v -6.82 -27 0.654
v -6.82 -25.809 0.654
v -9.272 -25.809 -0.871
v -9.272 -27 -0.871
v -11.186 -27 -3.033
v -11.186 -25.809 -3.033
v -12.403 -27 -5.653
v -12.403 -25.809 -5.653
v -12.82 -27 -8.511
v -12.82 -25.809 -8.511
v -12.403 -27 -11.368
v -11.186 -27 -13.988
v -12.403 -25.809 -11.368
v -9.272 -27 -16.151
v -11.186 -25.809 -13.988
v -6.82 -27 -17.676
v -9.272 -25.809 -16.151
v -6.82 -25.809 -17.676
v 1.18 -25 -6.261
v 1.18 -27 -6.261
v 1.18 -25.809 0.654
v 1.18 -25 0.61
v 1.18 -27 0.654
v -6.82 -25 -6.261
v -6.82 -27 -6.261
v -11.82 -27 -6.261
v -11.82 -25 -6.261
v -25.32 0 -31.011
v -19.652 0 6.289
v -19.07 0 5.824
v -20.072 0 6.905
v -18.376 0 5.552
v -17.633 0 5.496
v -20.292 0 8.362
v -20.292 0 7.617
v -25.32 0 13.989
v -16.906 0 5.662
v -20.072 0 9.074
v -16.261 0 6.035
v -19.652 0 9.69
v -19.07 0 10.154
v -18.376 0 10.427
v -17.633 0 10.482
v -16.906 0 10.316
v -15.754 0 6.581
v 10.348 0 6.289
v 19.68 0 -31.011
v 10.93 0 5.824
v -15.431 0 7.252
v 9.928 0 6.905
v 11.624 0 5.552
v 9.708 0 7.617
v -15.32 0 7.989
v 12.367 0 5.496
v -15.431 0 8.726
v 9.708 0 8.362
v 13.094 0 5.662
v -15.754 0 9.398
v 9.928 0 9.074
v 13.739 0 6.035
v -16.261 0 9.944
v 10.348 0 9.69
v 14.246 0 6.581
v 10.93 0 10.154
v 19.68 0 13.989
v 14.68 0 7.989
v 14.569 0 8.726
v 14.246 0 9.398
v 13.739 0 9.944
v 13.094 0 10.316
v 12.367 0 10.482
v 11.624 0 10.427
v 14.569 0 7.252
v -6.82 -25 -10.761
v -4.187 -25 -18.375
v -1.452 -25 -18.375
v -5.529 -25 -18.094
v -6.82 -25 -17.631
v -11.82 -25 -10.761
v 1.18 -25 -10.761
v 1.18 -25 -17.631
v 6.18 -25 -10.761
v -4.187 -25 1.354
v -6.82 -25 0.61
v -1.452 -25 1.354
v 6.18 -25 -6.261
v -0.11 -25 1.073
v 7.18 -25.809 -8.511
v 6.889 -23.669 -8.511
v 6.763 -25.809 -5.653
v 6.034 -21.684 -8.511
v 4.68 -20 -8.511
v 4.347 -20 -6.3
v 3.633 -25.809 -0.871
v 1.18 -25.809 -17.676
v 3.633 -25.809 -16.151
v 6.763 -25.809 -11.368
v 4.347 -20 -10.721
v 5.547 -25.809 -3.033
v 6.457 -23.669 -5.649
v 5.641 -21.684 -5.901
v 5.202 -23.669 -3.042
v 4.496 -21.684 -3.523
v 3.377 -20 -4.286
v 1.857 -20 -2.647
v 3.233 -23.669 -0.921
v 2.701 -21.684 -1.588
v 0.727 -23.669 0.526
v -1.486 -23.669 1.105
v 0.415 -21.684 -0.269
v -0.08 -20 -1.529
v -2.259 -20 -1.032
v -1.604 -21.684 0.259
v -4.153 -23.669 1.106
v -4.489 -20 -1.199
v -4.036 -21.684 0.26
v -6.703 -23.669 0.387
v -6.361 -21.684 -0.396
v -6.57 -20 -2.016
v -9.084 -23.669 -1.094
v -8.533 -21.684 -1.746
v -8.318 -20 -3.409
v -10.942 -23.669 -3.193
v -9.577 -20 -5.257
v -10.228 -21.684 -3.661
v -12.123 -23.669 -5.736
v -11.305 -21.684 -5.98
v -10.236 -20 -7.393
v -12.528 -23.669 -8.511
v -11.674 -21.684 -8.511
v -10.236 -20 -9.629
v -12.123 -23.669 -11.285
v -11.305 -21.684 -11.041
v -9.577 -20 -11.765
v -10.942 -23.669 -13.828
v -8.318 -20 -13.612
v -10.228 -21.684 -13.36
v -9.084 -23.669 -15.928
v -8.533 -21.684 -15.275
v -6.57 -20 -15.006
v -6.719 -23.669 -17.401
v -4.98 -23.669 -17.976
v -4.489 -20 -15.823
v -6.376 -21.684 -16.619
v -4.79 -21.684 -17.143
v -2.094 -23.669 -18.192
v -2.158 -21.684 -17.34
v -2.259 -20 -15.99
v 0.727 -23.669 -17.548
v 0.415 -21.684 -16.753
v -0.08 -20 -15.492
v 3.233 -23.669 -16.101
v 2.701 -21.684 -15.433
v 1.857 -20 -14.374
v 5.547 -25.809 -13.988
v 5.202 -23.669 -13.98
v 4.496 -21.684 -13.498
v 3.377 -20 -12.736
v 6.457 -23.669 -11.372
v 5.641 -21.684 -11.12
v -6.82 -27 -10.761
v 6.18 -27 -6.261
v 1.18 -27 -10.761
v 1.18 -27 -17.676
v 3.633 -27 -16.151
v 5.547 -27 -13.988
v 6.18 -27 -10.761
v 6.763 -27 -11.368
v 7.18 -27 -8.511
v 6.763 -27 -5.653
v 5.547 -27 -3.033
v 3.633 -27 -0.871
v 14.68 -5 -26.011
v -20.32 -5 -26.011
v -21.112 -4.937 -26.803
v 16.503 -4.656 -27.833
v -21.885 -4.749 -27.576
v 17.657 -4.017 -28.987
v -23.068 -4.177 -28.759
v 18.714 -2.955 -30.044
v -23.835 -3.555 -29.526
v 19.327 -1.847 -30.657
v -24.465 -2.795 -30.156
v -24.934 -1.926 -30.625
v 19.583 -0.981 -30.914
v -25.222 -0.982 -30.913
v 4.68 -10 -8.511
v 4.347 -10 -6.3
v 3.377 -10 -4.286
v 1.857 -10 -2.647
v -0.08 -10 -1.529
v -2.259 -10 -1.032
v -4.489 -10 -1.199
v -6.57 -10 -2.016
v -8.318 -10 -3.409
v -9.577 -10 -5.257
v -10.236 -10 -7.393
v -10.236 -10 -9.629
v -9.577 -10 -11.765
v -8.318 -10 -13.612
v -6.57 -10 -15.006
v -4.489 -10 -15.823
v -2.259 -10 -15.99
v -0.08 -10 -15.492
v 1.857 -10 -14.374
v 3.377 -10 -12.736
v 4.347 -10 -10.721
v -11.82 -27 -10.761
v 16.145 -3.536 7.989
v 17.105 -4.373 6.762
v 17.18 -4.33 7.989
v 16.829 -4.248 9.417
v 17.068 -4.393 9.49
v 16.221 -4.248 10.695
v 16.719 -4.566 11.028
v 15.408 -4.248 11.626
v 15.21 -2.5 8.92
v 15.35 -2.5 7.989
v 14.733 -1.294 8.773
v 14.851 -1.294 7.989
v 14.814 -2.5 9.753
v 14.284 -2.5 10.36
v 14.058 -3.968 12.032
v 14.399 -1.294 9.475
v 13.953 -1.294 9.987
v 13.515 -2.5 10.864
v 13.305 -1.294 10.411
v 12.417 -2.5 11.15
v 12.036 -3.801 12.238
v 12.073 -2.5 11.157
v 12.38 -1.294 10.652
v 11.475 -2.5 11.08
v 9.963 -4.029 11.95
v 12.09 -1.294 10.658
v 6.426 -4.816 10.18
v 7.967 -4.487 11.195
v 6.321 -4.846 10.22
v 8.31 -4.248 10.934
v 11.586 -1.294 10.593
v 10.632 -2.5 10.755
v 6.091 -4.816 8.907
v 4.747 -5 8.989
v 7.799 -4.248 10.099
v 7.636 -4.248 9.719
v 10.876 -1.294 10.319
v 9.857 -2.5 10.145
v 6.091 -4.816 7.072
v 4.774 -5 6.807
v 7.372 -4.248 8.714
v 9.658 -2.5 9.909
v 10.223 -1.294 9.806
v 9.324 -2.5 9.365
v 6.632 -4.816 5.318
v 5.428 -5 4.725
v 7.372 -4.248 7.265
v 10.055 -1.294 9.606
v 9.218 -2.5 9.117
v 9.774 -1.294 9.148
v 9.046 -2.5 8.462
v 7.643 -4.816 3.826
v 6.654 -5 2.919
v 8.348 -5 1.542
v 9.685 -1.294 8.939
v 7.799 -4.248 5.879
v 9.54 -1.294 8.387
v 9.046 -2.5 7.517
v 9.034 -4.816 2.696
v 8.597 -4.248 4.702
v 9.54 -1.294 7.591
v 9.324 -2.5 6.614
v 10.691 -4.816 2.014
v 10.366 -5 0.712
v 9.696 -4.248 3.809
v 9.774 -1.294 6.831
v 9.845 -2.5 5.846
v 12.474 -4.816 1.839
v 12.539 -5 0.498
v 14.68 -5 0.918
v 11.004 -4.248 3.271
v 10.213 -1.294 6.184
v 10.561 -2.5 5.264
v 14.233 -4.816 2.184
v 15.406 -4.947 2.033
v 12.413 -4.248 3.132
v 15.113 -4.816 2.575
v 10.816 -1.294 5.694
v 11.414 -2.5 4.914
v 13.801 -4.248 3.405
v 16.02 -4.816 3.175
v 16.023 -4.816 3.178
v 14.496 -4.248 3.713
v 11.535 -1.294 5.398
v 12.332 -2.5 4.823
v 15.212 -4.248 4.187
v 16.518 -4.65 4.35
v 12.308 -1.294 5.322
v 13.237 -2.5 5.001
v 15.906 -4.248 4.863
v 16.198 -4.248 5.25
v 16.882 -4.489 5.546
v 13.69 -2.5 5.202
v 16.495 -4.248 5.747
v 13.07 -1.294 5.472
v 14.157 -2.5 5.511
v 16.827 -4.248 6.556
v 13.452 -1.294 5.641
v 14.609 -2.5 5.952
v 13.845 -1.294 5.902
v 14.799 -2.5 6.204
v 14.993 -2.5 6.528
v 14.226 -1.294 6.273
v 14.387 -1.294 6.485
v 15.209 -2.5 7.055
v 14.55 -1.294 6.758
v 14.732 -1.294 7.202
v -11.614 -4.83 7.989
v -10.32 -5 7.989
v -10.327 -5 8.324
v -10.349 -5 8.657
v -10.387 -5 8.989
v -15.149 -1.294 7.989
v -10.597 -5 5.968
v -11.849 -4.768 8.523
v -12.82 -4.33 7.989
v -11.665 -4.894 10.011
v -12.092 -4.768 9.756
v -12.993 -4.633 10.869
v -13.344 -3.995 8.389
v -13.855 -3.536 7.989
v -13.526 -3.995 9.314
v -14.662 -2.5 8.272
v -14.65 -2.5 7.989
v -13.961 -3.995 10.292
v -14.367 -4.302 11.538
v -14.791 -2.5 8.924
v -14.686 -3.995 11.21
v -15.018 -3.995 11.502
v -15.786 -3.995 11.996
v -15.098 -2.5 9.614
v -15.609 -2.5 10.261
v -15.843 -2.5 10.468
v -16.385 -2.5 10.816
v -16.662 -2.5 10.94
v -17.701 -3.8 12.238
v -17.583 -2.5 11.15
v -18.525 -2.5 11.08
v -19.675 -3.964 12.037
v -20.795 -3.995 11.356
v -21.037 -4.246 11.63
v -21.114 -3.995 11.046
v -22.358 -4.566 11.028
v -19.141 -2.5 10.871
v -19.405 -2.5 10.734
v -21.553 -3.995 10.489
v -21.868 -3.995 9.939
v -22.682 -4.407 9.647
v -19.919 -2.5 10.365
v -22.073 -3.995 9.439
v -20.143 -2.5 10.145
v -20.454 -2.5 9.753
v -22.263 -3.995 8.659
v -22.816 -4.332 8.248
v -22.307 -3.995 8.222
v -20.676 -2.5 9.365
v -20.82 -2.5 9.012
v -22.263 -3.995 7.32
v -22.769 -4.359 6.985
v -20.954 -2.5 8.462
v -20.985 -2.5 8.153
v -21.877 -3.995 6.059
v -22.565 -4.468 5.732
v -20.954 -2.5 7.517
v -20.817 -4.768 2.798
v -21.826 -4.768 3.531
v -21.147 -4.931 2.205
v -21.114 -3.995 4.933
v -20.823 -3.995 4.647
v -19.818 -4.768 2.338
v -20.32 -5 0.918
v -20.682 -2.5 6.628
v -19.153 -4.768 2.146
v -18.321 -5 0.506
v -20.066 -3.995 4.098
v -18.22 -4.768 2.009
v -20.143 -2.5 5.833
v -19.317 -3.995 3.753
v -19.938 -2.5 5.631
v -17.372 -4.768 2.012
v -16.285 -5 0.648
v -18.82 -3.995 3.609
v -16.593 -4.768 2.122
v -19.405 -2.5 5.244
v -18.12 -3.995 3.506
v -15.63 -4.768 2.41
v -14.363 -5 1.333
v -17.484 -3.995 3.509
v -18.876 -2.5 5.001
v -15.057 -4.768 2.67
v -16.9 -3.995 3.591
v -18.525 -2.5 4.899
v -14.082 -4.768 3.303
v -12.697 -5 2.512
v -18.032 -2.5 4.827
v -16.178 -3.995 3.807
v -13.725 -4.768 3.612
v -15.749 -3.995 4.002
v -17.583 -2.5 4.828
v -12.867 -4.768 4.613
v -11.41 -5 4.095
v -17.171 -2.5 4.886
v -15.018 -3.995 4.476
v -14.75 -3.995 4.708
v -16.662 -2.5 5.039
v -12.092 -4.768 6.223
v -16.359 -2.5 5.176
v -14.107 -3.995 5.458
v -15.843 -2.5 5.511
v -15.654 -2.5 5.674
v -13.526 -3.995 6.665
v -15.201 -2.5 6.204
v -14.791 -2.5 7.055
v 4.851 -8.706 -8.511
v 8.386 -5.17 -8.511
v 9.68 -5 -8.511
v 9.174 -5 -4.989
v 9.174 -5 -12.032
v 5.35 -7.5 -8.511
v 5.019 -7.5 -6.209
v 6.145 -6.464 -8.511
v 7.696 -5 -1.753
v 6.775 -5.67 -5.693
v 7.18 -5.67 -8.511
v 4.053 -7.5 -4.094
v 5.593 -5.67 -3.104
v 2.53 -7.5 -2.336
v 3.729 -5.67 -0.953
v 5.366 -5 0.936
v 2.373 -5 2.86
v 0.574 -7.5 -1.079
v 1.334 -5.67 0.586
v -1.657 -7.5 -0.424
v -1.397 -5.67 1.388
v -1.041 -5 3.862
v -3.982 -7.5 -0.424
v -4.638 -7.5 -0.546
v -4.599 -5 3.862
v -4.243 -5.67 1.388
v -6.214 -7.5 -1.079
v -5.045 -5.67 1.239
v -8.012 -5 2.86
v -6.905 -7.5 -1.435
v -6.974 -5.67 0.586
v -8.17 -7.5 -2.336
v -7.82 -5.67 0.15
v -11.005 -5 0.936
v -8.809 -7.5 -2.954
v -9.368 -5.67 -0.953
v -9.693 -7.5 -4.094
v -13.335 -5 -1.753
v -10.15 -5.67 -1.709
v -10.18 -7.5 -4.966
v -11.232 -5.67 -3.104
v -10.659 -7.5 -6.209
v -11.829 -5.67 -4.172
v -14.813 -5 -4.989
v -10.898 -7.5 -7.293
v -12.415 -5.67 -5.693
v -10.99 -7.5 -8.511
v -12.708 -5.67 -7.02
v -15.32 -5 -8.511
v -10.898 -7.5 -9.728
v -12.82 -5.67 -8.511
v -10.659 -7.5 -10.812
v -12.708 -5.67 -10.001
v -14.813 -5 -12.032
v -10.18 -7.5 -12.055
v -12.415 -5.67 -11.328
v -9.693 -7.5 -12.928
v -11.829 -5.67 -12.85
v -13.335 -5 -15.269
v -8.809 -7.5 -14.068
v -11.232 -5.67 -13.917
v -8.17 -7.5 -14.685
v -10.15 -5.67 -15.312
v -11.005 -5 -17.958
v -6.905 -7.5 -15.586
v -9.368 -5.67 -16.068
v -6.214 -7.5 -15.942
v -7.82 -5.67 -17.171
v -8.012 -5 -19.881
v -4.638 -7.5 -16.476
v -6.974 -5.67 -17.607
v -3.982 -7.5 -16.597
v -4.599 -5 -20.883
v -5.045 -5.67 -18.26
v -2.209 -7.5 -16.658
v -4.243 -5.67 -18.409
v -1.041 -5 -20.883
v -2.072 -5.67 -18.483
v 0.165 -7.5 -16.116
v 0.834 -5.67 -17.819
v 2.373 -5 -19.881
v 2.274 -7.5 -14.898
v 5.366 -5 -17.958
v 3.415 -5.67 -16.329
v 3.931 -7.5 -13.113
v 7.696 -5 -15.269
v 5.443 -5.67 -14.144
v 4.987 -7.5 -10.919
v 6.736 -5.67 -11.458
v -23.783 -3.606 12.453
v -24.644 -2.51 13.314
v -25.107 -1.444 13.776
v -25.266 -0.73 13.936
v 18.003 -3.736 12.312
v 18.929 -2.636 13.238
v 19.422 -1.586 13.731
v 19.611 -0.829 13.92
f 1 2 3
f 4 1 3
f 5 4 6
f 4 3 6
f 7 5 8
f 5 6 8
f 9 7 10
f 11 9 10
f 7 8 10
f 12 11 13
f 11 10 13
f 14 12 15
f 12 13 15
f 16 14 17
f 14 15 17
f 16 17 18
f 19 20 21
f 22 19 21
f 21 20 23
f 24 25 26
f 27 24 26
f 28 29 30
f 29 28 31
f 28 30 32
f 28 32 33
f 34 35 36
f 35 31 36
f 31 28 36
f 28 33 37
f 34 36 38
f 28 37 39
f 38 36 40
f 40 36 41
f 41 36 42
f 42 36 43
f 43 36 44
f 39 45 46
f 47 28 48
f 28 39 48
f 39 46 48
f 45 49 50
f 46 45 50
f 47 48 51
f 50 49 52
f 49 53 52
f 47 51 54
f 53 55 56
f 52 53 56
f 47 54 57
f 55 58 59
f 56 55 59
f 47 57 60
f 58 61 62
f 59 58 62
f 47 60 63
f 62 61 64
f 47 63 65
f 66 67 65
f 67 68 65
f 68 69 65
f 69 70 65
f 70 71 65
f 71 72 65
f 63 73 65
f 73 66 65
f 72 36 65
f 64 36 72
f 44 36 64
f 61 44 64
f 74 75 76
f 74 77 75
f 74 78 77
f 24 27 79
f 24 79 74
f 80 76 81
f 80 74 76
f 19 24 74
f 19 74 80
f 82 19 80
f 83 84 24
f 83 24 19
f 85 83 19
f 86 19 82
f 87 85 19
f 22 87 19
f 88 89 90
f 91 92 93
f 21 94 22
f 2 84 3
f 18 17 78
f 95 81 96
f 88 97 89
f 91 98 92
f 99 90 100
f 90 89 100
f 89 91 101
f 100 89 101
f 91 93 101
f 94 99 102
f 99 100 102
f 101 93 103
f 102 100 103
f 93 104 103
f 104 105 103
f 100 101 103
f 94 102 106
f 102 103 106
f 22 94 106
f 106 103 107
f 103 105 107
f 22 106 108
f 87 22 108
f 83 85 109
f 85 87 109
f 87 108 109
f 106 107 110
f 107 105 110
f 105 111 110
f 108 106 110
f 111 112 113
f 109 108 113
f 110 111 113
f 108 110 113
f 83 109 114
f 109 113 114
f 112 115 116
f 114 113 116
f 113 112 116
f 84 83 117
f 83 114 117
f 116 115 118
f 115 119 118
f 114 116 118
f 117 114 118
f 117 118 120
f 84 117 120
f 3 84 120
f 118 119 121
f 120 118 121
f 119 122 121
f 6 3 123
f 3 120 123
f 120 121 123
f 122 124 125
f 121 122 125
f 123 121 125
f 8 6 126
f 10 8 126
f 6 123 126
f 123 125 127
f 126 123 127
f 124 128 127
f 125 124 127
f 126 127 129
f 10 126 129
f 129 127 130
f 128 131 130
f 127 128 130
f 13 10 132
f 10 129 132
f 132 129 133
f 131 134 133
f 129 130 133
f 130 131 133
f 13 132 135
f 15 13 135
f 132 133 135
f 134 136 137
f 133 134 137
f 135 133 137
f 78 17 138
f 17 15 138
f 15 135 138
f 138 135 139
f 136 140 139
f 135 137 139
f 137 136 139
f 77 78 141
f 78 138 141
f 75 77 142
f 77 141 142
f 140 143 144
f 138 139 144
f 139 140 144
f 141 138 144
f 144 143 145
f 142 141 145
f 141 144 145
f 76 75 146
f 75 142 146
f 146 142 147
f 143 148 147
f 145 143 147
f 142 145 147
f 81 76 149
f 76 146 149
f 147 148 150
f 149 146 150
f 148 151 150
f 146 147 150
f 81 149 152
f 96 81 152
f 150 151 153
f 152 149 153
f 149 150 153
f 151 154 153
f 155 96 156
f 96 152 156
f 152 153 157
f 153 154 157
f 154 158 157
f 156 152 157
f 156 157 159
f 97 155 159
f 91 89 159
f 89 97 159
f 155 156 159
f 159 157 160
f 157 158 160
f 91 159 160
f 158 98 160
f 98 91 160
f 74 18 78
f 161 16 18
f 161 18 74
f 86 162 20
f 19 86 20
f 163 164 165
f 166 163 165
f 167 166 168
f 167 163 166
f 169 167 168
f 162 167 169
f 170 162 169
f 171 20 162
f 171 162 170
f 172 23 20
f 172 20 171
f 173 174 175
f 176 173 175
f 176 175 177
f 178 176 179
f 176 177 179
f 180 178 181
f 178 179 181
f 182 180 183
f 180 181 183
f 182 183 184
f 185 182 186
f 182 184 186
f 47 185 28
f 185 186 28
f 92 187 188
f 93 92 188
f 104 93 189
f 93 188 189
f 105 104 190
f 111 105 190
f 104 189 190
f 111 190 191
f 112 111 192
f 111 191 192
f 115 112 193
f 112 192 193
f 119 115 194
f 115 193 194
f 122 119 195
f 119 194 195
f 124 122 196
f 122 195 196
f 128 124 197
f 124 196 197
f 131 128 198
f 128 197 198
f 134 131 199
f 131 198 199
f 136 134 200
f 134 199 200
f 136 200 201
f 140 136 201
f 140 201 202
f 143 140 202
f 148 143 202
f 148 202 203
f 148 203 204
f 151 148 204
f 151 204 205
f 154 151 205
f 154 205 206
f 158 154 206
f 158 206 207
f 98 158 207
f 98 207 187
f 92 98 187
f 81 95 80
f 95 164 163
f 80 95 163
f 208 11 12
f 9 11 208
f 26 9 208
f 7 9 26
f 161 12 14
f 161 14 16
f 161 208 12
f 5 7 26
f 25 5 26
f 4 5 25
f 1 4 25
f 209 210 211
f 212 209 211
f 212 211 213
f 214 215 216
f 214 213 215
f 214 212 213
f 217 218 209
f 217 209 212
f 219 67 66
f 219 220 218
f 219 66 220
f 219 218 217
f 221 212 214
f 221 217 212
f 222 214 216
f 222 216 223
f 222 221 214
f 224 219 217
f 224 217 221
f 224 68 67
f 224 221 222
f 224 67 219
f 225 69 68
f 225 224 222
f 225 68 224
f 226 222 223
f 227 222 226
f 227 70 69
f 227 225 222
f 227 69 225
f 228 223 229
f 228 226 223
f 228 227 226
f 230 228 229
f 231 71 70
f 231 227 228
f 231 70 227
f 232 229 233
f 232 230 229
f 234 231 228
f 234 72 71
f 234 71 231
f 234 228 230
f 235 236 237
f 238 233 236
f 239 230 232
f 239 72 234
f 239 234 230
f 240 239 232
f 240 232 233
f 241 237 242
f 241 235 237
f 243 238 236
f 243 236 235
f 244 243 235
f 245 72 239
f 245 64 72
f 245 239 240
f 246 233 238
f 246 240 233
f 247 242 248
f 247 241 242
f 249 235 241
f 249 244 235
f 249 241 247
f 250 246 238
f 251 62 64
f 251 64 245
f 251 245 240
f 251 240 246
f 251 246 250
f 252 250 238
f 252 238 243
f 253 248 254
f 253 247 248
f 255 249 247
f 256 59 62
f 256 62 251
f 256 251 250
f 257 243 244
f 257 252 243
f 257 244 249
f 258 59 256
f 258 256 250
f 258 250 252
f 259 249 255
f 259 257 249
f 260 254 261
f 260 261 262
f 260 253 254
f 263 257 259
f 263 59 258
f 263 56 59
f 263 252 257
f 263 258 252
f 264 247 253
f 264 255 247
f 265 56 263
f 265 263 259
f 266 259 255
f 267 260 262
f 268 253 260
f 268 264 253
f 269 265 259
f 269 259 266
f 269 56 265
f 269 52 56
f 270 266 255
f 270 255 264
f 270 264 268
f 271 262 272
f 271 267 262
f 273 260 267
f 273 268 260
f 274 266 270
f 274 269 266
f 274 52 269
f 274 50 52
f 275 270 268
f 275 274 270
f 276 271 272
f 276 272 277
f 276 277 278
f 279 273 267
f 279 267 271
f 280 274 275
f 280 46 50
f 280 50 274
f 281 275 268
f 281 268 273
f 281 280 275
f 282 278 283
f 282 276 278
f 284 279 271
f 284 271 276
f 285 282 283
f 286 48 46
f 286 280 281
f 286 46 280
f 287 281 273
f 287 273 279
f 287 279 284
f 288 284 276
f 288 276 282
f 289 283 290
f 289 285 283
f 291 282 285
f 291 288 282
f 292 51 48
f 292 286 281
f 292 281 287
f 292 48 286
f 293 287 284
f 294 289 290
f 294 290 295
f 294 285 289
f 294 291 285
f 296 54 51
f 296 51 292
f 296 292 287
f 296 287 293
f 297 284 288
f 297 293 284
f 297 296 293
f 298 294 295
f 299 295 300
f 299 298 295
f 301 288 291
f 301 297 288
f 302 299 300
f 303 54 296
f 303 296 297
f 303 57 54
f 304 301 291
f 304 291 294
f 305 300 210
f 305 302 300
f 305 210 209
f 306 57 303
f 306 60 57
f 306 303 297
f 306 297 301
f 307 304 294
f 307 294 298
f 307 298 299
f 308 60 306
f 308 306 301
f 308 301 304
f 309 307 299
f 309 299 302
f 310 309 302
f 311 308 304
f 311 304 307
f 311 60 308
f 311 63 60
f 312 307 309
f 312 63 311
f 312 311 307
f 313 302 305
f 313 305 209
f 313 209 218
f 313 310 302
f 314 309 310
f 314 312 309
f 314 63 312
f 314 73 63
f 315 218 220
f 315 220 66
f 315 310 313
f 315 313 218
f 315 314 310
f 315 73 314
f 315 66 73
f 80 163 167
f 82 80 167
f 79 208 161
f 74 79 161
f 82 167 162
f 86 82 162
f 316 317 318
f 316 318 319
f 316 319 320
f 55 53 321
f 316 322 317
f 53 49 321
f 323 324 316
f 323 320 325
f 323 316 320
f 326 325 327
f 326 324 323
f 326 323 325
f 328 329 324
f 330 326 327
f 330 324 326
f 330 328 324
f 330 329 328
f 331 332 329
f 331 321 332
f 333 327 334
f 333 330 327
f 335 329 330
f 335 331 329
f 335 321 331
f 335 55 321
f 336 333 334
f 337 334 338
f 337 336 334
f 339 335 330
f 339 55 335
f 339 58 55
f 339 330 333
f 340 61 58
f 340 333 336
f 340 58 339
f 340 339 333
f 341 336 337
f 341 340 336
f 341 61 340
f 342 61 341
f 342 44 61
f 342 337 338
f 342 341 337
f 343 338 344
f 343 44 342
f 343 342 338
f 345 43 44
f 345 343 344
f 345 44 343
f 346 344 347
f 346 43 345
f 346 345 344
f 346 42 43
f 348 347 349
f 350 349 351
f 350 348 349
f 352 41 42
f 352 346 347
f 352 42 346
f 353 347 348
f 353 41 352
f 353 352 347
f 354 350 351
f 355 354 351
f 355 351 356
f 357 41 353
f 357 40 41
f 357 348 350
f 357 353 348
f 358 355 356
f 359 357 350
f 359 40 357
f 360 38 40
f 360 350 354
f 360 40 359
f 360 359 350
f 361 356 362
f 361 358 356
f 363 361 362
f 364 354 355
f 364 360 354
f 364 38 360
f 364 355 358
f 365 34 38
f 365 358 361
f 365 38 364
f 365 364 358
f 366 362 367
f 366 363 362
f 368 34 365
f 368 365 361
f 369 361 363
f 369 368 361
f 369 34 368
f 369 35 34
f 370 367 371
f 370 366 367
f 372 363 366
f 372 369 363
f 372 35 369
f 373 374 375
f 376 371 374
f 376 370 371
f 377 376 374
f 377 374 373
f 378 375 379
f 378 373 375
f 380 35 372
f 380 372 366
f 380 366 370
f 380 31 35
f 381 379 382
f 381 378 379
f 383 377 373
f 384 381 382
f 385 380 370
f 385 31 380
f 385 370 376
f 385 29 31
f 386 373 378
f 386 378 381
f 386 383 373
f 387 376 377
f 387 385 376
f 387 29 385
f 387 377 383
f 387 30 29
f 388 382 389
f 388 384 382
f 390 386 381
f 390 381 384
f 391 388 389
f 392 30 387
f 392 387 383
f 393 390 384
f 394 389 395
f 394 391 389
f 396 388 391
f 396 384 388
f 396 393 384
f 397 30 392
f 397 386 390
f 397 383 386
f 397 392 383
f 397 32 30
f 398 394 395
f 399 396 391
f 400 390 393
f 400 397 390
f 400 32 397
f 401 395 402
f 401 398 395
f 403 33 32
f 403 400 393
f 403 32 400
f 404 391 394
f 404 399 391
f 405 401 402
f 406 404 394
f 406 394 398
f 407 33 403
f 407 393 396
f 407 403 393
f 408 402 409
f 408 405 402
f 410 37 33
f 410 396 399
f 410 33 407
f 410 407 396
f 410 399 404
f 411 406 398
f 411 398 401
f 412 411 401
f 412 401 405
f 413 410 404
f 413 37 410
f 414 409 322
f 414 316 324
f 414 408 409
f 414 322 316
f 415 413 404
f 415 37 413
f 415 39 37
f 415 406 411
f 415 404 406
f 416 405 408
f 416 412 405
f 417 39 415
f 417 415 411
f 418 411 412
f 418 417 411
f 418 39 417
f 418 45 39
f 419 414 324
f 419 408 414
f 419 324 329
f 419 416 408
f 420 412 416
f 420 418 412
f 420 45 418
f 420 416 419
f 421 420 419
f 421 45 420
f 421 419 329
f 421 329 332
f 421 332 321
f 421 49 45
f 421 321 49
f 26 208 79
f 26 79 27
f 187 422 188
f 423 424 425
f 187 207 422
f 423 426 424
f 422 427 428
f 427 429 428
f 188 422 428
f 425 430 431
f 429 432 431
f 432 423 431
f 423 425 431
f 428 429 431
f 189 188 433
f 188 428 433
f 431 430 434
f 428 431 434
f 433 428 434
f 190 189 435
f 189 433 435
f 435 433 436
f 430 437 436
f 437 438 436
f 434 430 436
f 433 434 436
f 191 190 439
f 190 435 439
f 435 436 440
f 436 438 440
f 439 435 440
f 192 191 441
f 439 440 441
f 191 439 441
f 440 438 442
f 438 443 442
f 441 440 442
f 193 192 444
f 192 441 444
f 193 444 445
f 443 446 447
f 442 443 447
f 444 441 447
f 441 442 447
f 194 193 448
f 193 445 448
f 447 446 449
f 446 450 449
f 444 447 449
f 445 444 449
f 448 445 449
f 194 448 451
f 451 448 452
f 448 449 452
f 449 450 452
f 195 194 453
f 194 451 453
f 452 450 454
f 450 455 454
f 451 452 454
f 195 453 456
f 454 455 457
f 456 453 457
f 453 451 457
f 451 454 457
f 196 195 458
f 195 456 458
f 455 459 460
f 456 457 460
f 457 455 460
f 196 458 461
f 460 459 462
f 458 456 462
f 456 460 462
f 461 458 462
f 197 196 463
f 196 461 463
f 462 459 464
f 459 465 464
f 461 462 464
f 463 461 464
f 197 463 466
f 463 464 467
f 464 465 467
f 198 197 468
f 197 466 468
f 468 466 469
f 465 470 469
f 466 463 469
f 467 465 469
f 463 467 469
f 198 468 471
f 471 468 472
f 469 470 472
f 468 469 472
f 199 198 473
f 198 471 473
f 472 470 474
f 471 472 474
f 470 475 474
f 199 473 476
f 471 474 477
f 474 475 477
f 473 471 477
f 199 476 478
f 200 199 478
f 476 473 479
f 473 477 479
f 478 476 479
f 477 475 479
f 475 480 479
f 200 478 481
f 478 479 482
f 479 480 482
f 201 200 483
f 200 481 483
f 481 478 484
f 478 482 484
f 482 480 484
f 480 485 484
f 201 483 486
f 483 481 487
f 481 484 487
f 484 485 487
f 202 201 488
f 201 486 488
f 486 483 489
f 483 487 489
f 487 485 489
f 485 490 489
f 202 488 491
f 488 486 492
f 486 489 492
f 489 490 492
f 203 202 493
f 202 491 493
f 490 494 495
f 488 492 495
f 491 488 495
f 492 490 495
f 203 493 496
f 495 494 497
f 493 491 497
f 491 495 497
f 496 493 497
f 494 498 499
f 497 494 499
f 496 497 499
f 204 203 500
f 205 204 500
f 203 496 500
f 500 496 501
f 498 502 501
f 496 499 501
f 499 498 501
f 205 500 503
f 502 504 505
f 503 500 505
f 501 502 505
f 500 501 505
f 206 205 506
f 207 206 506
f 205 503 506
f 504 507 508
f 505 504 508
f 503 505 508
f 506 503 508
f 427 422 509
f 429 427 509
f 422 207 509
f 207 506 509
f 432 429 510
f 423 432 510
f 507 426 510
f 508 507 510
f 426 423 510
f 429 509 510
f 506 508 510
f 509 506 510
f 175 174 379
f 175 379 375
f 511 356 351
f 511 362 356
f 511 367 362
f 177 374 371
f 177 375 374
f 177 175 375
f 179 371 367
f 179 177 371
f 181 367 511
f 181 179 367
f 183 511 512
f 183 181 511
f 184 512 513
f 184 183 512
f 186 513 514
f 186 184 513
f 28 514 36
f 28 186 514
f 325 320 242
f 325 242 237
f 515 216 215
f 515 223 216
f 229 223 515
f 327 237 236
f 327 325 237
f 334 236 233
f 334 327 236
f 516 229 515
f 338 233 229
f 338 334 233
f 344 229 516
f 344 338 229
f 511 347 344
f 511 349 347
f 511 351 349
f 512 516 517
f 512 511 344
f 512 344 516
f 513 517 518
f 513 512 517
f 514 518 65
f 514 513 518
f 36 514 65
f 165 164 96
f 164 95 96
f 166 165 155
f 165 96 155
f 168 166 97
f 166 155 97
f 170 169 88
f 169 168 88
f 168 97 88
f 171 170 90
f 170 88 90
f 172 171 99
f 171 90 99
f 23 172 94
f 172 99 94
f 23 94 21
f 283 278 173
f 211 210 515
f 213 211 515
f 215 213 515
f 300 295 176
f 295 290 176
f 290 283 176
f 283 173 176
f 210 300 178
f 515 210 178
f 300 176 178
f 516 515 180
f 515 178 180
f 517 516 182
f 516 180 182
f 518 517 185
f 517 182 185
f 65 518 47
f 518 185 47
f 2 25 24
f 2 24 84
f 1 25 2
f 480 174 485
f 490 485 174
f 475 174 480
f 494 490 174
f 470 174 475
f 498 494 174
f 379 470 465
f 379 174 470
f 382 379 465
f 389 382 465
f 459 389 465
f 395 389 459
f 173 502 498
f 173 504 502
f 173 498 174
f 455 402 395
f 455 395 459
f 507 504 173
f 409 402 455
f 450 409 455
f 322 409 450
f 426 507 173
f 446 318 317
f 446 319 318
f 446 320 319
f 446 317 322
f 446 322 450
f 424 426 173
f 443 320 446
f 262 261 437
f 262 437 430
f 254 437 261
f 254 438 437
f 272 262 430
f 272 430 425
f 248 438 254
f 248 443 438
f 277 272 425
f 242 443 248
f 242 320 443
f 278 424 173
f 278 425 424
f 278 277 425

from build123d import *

# Parameters (mm, degrees)
F0_R        = 7.5
F1_DEPTH    = 20
F0_W        = 45
F0_H        = 45
F2_DEPTH    = 5
F3_R        = 2.5
F4_DEPTH    = 25
F5_R        = 10
F5_R_2      = 7.5
F6_DEPTH    = 7
F7_W        = 8
F7_H        = 9.7702028193
F7_W_2      = 5
F7_H_2      = 4.5
F8_DEPTH    = 2
F9_T3_DEPTH = 70
F9_T5_DEPTH = 70


# Not quite as in the source:
# - a fillet or chamfer that OpenCascade refuses, or shapes differently, is made with other operations: its cross-section is extruded or revolved along the edge and cut away or added


with BuildPart() as f1:
    # F0 (on Front) → F1 (new body)
    with BuildSketch(Plane.XZ):
        with Locations((-2.8196598027, -8.5107027553)):
            Circle(F0_R)
    extrude(amount=F1_DEPTH)

    # F0 (on Front) → F2 (join)
    with BuildSketch(Plane.XZ):
        with Locations((-2.8196598027, -8.5107027553)):
            Rectangle(F0_W, F0_H)
        with Locations((-2.8196598027, -8.5107027553)):
            Circle(F0_R, mode=Mode.SUBTRACT)
    extrude(amount=F2_DEPTH)

    # F3 (on face) → F4 (cut)
    with BuildSketch(Plane.XZ.offset(5)):
        with Locations((12.1803401973, 7.9892972447)):
            Circle(F3_R)
        with Locations((-17.8196598027, 7.9892972447)):
            Circle(F3_R)
    extrude(amount=-F4_DEPTH, mode=Mode.SUBTRACT)

    # F5 (on face) → F6 (join)
    with BuildSketch(Plane.XZ.offset(20)):
        with Locations((-2.8196598027, -8.5107027553)):
            Circle(F5_R)
        with Locations((-2.8196598027, -8.5107027553)):
            Circle(F5_R_2, mode=Mode.SUBTRACT)
        with Locations((-2.8196598027, -8.5107027553)):
            Circle(F5_R_2)
    extrude(amount=F6_DEPTH)

    # F7 (on face) → F8 (cut)
    with BuildSketch(Plane.XZ.offset(27)):
        with Locations((-2.8196598027, -15.6458041649)):
            Rectangle(F7_W, F7_H)
        with Locations((-9.3196598027, -8.5107027553)):
            Rectangle(F7_W_2, F7_H_2)
        with Locations((-2.8196598027, -8.5107027553)):
            Rectangle(F7_W, F7_H_2)
        with Locations((3.6803401973, -8.5107027553)):
            Rectangle(F7_W_2, F7_H_2)
        with Locations((-2.8196598027, -1.3756013457)):
            Rectangle(F7_W, F7_H)
    extrude(amount=-F8_DEPTH, mode=Mode.SUBTRACT)

    # F9: fillet of radius 5 on 7 edges, made by hand

    # F9_s1 → F9_t2 (revolve)
    with BuildSketch(Plane.XY.offset(-8.5107027553)):
        with BuildLine():
            ThreePointArc((4.6803401973, -10), (6.1448062914, -6.4644660941), (9.6803401973, -5))
            Line((9.6803401973, -5), (4.6803401973, -5))
            Line((4.6803401973, -5), (4.6803401973, -10))
        make_face()
    revolve(axis=Axis((-2.8196598027, -5, -8.5107027553), (0, -1, 0)))

    # F9_s4 → F9_t3 (cut)
    with BuildSketch(Plane.YZ.offset(-37.8196598027)):
        with BuildLine():
            ThreePointArc((-5, 8.9892972447), (-3.5355339059, 12.5248311506), (0, 13.9892972447))
            Line((0, 13.9892972447), (-5, 13.9892972447))
            Line((-5, 13.9892972447), (-5, 8.9892972447))
        make_face()
        with BuildLine():
            ThreePointArc((-5, -26.0107027553), (-3.5355339059, -29.5462366612), (0, -31.0107027553))
            Line((0, -31.0107027553), (-5, -31.0107027553))
            Line((-5, -31.0107027553), (-5, -26.0107027553))
        make_face()
    extrude(amount=F9_T3_DEPTH, mode=Mode.SUBTRACT)

    # F9_s6 → F9_t5 (cut)
    with BuildSketch(Plane.XY.offset(-43.5107027553)):
        with BuildLine():
            ThreePointArc((14.6803401973, -5), (18.2158741033, -3.5355339059), (19.6803401973, 0))
            Line((19.6803401973, 0), (19.6803401973, -5))
            Line((19.6803401973, -5), (14.6803401973, -5))
        make_face()
        with BuildLine():
            ThreePointArc((-20.3196598027, -5), (-23.8551937086, -3.5355339059), (-25.3196598027, 0))
            Line((-25.3196598027, 0), (-25.3196598027, -5))
            Line((-25.3196598027, -5), (-20.3196598027, -5))
        make_face()
    extrude(amount=F9_T5_DEPTH, mode=Mode.SUBTRACT)

    # F9_s7 → F9_t8 (revolve, cut)
    with BuildSketch(Plane.XY.offset(7.9892972447)):
        with BuildLine():
            ThreePointArc((-10.3196598027, -5), (-13.8551937086, -3.5355339059), (-15.3196598027, 0))
            Line((-15.3196598027, 0), (-15.3196598027, -5))
            Line((-15.3196598027, -5), (-10.3196598027, -5))
        make_face()
    revolve(axis=Axis((-17.8196598027, -5, 7.9892972447), (0, -1, 0)), mode=Mode.SUBTRACT)

    # F9_s9 → F9_t10 (revolve, cut)
    with BuildSketch(Plane.XY.offset(7.9892972447)):
        with BuildLine():
            ThreePointArc((19.6803401973, -5), (16.1448062914, -3.5355339059), (14.6803401973, 0))
            Line((14.6803401973, 0), (14.6803401973, -5))
            Line((14.6803401973, -5), (19.6803401973, -5))
        make_face()
    revolve(axis=Axis((12.1803401973, -5, 7.9892972447), (0, -1, 0)), mode=Mode.SUBTRACT)

    # F10: fillet of radius 8 on 1 edges, made by hand

    # F10_s1 → F10_t2 (revolve, cut)
    with BuildSketch(Plane.XY.offset(-8.5107027553)):
        with BuildLine():
            ThreePointArc((7.1803401973, -25.8094750193), (6.5288094257, -22.6471973591), (4.6803401973, -20))
            Line((4.6803401973, -20), (7.1803401973, -20))
            Line((7.1803401973, -20), (7.1803401973, -25.8094750193))
        make_face()
    revolve(axis=Axis((-2.8196598027, -20, -8.5107027553), (0, -1, 0)), mode=Mode.SUBTRACT)


solid = f1.part
